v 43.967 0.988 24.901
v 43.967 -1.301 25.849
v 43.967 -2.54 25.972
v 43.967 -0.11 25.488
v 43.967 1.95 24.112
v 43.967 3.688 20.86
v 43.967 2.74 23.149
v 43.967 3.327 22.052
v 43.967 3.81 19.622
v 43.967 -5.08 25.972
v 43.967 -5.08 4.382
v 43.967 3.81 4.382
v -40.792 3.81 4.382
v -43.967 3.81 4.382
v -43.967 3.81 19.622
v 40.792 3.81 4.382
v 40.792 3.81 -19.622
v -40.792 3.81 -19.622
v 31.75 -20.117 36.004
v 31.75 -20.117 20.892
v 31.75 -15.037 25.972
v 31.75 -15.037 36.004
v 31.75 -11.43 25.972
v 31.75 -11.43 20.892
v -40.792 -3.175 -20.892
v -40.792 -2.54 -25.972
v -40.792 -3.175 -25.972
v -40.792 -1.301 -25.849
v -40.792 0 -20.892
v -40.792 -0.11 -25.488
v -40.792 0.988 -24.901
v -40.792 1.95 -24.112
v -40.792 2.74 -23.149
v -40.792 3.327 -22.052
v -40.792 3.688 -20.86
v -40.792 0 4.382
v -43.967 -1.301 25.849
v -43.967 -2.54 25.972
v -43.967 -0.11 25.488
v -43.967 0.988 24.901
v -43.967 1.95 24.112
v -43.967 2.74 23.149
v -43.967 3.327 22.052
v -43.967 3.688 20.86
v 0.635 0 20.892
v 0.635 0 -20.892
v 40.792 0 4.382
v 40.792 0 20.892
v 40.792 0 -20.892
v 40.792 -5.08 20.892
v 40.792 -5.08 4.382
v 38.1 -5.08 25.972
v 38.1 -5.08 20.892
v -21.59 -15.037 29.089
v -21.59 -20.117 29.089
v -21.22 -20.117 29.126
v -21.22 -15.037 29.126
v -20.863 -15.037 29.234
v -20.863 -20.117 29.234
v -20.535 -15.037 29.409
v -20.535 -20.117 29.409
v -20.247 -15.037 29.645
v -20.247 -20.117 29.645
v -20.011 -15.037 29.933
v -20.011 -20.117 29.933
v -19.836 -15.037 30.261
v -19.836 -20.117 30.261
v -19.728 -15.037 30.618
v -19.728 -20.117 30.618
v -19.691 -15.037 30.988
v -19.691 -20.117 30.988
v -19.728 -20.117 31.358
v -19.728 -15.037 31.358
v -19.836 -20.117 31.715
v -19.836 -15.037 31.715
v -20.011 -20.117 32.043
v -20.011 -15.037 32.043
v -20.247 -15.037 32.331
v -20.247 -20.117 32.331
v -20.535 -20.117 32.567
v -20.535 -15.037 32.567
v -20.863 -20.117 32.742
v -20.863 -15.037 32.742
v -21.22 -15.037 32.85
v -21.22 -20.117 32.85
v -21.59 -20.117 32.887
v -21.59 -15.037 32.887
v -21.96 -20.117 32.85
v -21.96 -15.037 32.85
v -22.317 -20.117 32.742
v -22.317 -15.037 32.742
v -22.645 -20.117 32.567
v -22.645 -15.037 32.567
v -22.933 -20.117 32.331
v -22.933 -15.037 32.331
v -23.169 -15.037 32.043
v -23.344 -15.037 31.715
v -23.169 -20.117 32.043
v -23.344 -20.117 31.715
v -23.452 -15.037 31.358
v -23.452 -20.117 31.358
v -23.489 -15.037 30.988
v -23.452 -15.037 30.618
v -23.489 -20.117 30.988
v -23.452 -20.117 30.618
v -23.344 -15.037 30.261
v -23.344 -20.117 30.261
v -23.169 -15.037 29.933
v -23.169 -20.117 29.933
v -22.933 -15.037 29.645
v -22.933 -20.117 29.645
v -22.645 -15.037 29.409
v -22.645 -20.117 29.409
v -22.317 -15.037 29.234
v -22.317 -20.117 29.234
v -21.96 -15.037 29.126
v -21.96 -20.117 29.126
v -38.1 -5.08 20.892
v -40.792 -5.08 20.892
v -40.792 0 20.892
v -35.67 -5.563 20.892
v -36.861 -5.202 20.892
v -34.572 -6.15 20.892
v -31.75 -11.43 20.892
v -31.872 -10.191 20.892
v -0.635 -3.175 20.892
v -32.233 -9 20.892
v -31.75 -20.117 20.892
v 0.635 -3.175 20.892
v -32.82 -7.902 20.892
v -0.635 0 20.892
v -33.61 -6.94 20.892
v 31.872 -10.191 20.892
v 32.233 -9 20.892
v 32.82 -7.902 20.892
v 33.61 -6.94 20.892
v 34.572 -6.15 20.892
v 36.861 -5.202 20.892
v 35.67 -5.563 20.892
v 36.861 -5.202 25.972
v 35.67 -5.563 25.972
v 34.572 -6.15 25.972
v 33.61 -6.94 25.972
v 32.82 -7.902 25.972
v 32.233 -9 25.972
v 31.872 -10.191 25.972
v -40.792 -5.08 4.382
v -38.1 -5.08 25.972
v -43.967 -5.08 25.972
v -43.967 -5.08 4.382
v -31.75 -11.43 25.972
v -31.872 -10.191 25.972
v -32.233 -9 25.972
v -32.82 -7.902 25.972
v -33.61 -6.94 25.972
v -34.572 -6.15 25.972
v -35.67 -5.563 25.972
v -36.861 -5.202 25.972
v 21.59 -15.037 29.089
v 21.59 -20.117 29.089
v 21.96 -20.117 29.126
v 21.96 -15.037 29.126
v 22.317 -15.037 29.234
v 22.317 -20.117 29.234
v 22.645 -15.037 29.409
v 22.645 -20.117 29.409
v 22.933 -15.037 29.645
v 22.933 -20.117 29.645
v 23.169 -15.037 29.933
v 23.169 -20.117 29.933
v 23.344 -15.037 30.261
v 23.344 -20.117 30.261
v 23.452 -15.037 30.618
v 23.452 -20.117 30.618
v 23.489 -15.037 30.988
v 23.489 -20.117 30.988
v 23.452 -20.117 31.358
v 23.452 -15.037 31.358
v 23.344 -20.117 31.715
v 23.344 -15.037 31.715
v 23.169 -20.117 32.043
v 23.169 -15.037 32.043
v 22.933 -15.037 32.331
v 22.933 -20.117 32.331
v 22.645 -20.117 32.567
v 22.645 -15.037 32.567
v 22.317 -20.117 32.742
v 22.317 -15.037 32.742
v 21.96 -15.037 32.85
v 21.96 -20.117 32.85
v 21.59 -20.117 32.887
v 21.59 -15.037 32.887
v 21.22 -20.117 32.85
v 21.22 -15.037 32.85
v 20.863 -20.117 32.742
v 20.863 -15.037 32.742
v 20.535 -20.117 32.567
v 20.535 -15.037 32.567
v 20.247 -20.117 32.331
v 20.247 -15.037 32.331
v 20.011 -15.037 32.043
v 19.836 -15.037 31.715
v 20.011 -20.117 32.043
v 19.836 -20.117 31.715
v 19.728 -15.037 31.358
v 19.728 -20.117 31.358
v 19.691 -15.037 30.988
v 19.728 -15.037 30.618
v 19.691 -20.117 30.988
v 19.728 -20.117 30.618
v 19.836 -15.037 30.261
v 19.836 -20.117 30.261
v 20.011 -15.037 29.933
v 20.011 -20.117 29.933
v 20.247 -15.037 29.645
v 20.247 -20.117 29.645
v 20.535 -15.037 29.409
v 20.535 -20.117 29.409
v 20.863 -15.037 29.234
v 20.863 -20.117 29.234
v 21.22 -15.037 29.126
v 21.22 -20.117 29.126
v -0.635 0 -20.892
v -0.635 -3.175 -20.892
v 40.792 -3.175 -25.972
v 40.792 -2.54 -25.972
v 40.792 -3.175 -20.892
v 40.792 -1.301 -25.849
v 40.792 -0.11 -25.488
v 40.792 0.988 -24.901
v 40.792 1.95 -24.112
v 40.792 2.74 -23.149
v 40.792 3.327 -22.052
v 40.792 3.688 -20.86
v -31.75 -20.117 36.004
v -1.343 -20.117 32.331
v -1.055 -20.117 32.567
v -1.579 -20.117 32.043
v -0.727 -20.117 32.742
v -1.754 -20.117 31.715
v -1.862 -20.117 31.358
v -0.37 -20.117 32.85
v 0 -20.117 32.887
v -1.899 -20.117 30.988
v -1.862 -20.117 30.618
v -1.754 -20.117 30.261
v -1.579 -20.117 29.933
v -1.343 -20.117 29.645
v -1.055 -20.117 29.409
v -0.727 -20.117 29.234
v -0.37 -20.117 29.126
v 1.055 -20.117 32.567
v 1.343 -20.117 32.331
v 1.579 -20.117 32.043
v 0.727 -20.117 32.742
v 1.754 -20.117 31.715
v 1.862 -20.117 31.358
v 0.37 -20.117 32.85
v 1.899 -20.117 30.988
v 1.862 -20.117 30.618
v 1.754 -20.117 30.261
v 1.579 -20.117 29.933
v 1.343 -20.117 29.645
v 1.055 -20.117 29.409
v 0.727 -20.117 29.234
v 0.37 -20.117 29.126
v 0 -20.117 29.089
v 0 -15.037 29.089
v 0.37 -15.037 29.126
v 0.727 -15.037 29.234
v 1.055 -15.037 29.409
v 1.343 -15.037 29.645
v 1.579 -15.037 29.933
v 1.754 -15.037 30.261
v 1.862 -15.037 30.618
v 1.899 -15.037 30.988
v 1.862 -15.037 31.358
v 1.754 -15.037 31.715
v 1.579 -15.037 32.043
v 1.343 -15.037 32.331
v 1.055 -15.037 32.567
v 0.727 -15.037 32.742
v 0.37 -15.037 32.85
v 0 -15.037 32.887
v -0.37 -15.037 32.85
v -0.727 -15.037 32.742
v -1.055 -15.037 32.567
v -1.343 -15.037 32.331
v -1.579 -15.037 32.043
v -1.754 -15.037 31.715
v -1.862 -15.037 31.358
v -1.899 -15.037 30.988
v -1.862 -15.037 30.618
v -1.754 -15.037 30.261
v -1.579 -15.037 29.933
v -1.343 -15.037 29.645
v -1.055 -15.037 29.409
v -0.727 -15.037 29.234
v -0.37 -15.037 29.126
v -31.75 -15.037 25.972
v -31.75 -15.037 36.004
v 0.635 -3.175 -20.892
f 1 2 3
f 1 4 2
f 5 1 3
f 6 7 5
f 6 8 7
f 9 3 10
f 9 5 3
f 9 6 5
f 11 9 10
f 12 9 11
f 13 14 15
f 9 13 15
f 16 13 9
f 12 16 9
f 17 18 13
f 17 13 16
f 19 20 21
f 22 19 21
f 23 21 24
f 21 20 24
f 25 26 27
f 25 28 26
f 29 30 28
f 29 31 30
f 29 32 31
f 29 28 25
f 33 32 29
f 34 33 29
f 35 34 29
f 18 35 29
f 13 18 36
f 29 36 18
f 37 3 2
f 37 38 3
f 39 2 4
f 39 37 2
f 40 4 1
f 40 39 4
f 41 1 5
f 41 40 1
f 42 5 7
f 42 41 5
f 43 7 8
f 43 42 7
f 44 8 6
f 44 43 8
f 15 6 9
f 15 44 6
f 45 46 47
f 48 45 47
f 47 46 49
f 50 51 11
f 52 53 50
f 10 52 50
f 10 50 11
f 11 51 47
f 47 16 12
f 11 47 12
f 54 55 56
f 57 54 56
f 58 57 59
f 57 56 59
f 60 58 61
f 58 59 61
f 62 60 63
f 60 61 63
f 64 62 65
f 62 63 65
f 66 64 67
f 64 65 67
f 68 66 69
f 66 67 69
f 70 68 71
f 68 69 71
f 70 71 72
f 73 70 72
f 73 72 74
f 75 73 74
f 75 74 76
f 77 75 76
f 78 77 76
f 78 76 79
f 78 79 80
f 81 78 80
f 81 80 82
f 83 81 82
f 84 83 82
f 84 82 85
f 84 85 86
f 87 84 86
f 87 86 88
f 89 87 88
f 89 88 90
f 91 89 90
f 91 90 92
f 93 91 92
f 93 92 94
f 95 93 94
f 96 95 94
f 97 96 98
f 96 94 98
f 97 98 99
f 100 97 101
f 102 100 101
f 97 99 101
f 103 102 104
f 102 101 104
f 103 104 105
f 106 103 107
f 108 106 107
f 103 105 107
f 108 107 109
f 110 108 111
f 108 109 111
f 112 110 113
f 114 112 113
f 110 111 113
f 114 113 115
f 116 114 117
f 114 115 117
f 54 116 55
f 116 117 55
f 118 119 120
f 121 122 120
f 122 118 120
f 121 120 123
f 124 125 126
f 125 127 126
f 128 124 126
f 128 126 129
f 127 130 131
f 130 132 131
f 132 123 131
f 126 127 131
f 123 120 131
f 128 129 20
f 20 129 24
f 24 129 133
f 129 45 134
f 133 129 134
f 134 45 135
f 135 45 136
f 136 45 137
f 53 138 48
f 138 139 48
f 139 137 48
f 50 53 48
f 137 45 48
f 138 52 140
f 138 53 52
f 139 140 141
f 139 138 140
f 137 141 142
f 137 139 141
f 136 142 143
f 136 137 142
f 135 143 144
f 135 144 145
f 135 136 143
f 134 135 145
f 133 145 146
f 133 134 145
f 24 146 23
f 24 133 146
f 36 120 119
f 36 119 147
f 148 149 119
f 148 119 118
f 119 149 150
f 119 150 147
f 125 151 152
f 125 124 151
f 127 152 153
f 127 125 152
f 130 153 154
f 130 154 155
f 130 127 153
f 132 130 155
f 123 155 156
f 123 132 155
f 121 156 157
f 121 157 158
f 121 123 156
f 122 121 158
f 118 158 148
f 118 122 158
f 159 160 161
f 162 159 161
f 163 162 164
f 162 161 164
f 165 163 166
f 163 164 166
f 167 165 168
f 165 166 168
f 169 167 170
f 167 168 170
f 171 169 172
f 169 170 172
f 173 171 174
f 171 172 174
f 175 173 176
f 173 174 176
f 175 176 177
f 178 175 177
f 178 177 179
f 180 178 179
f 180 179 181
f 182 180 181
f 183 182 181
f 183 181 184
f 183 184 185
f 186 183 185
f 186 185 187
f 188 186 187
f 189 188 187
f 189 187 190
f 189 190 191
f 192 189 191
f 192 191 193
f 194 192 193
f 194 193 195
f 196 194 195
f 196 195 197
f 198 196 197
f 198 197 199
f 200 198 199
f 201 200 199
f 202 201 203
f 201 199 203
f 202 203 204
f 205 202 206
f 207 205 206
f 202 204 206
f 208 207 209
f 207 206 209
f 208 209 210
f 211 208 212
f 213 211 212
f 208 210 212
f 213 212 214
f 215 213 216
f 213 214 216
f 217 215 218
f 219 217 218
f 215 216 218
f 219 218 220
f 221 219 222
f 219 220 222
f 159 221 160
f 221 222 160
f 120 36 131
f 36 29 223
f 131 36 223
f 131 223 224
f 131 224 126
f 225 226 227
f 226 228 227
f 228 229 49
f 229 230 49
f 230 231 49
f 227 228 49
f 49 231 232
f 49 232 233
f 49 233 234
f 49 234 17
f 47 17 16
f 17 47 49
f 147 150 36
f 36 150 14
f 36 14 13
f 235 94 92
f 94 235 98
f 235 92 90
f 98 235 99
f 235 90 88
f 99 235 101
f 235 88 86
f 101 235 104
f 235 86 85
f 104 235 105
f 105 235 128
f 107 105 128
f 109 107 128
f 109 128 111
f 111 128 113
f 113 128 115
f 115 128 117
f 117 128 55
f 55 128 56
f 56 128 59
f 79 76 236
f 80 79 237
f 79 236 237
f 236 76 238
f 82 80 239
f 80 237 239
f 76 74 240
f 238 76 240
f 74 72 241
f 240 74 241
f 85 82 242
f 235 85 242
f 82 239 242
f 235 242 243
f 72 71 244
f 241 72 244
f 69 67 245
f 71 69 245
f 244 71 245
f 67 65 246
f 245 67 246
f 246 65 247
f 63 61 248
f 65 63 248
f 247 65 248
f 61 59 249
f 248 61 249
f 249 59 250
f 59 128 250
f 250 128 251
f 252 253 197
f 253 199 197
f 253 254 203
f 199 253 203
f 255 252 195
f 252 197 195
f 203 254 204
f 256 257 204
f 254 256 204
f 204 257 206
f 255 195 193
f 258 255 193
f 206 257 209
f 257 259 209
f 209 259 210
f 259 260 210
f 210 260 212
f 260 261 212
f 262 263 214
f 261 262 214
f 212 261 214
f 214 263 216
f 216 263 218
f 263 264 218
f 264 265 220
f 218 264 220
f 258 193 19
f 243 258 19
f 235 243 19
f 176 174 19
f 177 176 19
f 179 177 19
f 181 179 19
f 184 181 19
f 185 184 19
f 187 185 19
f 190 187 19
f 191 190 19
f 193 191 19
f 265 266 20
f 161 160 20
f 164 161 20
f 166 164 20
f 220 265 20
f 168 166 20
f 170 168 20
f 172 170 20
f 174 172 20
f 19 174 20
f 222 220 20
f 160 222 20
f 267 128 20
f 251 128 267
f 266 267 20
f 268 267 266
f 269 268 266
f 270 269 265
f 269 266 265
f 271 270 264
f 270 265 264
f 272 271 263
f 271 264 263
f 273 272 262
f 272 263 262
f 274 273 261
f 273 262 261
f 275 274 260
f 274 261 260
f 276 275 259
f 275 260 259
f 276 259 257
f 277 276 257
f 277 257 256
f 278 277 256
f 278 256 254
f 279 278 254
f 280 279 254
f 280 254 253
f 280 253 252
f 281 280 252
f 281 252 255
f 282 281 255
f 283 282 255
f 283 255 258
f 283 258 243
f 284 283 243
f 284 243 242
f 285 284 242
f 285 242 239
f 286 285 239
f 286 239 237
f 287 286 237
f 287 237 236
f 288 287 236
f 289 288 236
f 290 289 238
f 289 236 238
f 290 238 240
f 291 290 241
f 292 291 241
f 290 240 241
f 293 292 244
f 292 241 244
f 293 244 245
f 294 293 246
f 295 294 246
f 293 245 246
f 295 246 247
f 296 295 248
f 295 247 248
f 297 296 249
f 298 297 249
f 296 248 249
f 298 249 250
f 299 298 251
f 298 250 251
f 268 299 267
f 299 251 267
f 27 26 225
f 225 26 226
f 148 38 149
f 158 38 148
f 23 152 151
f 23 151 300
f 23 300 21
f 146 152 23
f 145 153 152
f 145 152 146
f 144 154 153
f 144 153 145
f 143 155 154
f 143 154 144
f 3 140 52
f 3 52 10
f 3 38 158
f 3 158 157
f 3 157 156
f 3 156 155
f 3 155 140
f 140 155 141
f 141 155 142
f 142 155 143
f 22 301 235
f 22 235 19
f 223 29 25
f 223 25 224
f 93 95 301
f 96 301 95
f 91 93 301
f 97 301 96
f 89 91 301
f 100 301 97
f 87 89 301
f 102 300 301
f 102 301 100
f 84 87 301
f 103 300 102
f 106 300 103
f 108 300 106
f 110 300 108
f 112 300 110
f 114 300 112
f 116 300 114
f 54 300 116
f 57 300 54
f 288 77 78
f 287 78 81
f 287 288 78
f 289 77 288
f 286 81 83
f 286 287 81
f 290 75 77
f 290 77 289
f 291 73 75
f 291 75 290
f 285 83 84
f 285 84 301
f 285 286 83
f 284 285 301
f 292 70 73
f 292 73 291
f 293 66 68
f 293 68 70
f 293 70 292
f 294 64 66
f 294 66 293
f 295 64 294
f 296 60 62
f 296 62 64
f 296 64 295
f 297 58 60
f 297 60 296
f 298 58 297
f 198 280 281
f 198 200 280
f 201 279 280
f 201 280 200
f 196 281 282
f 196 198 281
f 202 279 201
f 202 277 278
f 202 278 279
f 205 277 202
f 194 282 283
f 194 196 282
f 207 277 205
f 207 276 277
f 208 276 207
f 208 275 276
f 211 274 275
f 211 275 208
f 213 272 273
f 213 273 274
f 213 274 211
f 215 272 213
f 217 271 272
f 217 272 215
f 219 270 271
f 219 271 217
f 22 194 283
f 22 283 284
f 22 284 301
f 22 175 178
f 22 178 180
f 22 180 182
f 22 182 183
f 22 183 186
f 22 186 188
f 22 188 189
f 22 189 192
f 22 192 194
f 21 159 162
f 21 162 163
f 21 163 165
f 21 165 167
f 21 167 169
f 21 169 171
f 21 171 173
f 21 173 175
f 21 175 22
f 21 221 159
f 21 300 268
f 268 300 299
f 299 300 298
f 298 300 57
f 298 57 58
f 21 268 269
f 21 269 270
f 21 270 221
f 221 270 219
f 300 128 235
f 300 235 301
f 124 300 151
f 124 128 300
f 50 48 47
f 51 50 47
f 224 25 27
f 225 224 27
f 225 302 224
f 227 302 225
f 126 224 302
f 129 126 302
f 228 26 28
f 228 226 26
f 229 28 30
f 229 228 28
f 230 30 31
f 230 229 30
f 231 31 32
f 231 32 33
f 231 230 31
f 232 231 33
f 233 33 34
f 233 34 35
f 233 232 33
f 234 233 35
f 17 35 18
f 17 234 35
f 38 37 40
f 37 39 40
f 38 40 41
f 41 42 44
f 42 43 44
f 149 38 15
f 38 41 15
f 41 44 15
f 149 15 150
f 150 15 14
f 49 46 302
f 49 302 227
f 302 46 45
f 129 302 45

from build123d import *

# Parameters (mm, degrees)
SKETCH1_W             = 81.5848
SKETCH1_H             = 51.943
BOSS_EXTRUDE1_DEPTH   = 3.81
SKETCH2_W             = 63.5
SKETCH2_H             = 5.08
BOSS_EXTRUDE2_DEPTH   = 20.1168
SKETCH3_W             = 81.5848
SKETCH3_H             = 5.08
BOSS_EXTRUDE3_DEPTH   = 3.175
SKETCH4_W             = 63.5
SKETCH4_H             = 5.08
BOSS_EXTRUDE4_DEPTH   = 10.033
SKETCH6_W             = 3.175
SKETCH6_H             = 21.59
BOSS_EXTRUDE5_DEPTH   = 8.89
FILLET1_R             = 6.35
SKETCH7_W             = 9.0424
SKETCH7_H             = 5.08
BOSS_EXTRUDE6_DEPTH   = 5.08
FILLET2_R             = 6.35
FILLET3_R             = 6.35
SKETCH8_W             = 1.27
SKETCH8_H             = 41.783
BOSS_EXTRUDE7_DEPTH   = 3.175
F_6_CLEARANCE_HOLE1_D = 3.7973


with BuildPart() as part:
    # Sketch1 → Boss-Extrude1 (new body)
    with BuildSketch(Plane(origin=(0, 0, 0), x_dir=(1, 0, 0), z_dir=(0, 1, 0))):
        Rectangle(SKETCH1_W, SKETCH1_H)
    extrude(amount=BOSS_EXTRUDE1_DEPTH)

    # Sketch2 → Boss-Extrude2 (add)
    with BuildSketch(Plane.XZ):
        with Locations((0, 23.4315)):
            Rectangle(SKETCH2_W, SKETCH2_H)
    extrude(amount=BOSS_EXTRUDE2_DEPTH)

    # Sketch3 → Boss-Extrude3 (add)
    with BuildSketch(Plane.XZ):
        with Locations((0, -23.4315)):
            Rectangle(SKETCH3_W, SKETCH3_H)
    extrude(amount=BOSS_EXTRUDE3_DEPTH)

    # Sketch4 → Boss-Extrude4 (add)
    with BuildSketch(Plane.XY.offset(25.9715)):
        with Locations((0, -17.5768)):
            Rectangle(SKETCH4_W, SKETCH4_H)
    extrude(amount=BOSS_EXTRUDE4_DEPTH)

    # Sketch6 → Boss-Extrude5 (add)
    with BuildSketch(Plane(origin=(0, 3.81, 0), x_dir=(1, 0, 0), z_dir=(0, 1, 0))):
        with Locations((-42.3799, -15.1765)):
            Rectangle(SKETCH6_W, SKETCH6_H)
        with Locations((42.3799, -15.1765)):
            Rectangle(SKETCH6_W, SKETCH6_H)
    extrude(amount=-BOSS_EXTRUDE5_DEPTH)

    # Fillet1
    fillet1_edges = [part.edges().sort_by_distance(p)[0] for p in [
        (0, 3.81, -25.9715),
    ]]
    fillet(fillet1_edges, radius=FILLET1_R)

    # Sketch7 → Boss-Extrude6 (add)
    with BuildSketch(Plane.XY.offset(25.9715)):
        with Locations((36.2712, -2.54)):
            Rectangle(SKETCH7_W, SKETCH7_H)
        with Locations((-36.2712, -2.54)):
            Rectangle(SKETCH7_W, SKETCH7_H)
    extrude(amount=-BOSS_EXTRUDE6_DEPTH)

    # Fillet2
    fillet2_edges = [part.edges().sort_by_distance(p)[0] for p in [
        (-31.75, -5.08, 23.4315),
        (31.75, -5.08, 23.4315),
    ]]
    fillet(fillet2_edges, radius=FILLET2_R)

    # Fillet3
    fillet3_edges = [part.edges().sort_by_distance(p)[0] for p in [
        (0, 3.81, 25.9715),
    ]]
    fillet(fillet3_edges, radius=FILLET3_R)

    # Sketch8 → Boss-Extrude7 (add)
    with BuildSketch(Plane.XZ):
        Rectangle(SKETCH8_W, SKETCH8_H)
    extrude(amount=BOSS_EXTRUDE7_DEPTH)

    # #6 Clearance Hole1 (through all)
    with Locations(Plane(origin=(21.59, -15.0368, 30.988), x_dir=(0, 0, 1), z_dir=(0, 1, 0))):
        with Locations((0, 0), (0, -43.18), (0, -21.59)):
            Hole(F_6_CLEARANCE_HOLE1_D / 2)


solid = part.part
